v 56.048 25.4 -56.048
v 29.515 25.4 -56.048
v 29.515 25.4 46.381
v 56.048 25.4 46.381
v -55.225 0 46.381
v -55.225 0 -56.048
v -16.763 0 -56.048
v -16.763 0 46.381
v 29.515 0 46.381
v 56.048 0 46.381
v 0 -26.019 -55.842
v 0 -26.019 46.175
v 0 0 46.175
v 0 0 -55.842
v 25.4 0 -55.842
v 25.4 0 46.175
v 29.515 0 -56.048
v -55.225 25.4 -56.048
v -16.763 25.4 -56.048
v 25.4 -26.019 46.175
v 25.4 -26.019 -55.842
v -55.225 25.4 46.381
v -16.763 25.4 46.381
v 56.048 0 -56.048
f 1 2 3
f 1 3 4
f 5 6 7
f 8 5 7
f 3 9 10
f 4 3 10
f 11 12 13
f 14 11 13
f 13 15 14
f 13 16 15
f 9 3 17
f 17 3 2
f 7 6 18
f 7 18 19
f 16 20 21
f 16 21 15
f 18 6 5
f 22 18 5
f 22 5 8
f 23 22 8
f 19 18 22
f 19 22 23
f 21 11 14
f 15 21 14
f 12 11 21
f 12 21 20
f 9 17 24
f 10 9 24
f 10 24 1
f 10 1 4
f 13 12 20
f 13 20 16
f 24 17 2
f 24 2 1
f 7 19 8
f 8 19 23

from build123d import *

# Parameters (mm, degrees)
F0_W     = 111.2735532224
F0_H     = 102.4292558432
F1_DEPTH = 25.4
F2_W     = 26.0186772794
F2_H     = 102.0178943872
F3_DEPTH = 25.4
F4_W     = 25.9158369154
F4_H     = 77.1304611117
F4_W_2   = 20.3624423593
F4_H_2   = 22.6249378175
F4_H_3   = 2.673856914
F5_DEPTH = 25.4


with BuildPart() as f1:
    # F0 (on Front) → F1 (new body)
    with BuildSketch(Plane.XZ):
        with Locations((0.4113633186, -4.8335082829)):
            Rectangle(F0_W, F0_H)
    extrude(amount=-F1_DEPTH)

    # F2 (on Right) → F3 (join)
    with BuildSketch(Plane.YZ):
        with Locations((-13.0093386397, -4.8335082829)):
            Rectangle(F2_W, F2_H)
    extrude(amount=F3_DEPTH)

    # F4 (on face) → F5 (cut)
    with BuildSketch(Plane(origin=(0, 25.4, 0), x_dir=(-1, 0, 0), z_dir=(0, 1, 0))):
        with Locations((3.8051037118, -17.4829056486)):
            Rectangle(F4_W, F4_H)
        with Locations((-19.3340359256, -17.4829056486)):
            Rectangle(F4_W_2, F4_H)
        with Locations((-19.3340359256, 32.3947938159)):
            Rectangle(F4_W_2, F4_H_2)
        with Locations((3.8051037118, 32.3947938159)):
            Rectangle(F4_W, F4_H_2)
        with Locations((-19.3340359256, 45.0441911817)):
            Rectangle(F4_W_2, F4_H_3)
        with Locations((3.8051037118, 45.0441911817)):
            Rectangle(F4_W, F4_H_3)
    extrude(amount=-F5_DEPTH, mode=Mode.SUBTRACT)


solid = f1.part
